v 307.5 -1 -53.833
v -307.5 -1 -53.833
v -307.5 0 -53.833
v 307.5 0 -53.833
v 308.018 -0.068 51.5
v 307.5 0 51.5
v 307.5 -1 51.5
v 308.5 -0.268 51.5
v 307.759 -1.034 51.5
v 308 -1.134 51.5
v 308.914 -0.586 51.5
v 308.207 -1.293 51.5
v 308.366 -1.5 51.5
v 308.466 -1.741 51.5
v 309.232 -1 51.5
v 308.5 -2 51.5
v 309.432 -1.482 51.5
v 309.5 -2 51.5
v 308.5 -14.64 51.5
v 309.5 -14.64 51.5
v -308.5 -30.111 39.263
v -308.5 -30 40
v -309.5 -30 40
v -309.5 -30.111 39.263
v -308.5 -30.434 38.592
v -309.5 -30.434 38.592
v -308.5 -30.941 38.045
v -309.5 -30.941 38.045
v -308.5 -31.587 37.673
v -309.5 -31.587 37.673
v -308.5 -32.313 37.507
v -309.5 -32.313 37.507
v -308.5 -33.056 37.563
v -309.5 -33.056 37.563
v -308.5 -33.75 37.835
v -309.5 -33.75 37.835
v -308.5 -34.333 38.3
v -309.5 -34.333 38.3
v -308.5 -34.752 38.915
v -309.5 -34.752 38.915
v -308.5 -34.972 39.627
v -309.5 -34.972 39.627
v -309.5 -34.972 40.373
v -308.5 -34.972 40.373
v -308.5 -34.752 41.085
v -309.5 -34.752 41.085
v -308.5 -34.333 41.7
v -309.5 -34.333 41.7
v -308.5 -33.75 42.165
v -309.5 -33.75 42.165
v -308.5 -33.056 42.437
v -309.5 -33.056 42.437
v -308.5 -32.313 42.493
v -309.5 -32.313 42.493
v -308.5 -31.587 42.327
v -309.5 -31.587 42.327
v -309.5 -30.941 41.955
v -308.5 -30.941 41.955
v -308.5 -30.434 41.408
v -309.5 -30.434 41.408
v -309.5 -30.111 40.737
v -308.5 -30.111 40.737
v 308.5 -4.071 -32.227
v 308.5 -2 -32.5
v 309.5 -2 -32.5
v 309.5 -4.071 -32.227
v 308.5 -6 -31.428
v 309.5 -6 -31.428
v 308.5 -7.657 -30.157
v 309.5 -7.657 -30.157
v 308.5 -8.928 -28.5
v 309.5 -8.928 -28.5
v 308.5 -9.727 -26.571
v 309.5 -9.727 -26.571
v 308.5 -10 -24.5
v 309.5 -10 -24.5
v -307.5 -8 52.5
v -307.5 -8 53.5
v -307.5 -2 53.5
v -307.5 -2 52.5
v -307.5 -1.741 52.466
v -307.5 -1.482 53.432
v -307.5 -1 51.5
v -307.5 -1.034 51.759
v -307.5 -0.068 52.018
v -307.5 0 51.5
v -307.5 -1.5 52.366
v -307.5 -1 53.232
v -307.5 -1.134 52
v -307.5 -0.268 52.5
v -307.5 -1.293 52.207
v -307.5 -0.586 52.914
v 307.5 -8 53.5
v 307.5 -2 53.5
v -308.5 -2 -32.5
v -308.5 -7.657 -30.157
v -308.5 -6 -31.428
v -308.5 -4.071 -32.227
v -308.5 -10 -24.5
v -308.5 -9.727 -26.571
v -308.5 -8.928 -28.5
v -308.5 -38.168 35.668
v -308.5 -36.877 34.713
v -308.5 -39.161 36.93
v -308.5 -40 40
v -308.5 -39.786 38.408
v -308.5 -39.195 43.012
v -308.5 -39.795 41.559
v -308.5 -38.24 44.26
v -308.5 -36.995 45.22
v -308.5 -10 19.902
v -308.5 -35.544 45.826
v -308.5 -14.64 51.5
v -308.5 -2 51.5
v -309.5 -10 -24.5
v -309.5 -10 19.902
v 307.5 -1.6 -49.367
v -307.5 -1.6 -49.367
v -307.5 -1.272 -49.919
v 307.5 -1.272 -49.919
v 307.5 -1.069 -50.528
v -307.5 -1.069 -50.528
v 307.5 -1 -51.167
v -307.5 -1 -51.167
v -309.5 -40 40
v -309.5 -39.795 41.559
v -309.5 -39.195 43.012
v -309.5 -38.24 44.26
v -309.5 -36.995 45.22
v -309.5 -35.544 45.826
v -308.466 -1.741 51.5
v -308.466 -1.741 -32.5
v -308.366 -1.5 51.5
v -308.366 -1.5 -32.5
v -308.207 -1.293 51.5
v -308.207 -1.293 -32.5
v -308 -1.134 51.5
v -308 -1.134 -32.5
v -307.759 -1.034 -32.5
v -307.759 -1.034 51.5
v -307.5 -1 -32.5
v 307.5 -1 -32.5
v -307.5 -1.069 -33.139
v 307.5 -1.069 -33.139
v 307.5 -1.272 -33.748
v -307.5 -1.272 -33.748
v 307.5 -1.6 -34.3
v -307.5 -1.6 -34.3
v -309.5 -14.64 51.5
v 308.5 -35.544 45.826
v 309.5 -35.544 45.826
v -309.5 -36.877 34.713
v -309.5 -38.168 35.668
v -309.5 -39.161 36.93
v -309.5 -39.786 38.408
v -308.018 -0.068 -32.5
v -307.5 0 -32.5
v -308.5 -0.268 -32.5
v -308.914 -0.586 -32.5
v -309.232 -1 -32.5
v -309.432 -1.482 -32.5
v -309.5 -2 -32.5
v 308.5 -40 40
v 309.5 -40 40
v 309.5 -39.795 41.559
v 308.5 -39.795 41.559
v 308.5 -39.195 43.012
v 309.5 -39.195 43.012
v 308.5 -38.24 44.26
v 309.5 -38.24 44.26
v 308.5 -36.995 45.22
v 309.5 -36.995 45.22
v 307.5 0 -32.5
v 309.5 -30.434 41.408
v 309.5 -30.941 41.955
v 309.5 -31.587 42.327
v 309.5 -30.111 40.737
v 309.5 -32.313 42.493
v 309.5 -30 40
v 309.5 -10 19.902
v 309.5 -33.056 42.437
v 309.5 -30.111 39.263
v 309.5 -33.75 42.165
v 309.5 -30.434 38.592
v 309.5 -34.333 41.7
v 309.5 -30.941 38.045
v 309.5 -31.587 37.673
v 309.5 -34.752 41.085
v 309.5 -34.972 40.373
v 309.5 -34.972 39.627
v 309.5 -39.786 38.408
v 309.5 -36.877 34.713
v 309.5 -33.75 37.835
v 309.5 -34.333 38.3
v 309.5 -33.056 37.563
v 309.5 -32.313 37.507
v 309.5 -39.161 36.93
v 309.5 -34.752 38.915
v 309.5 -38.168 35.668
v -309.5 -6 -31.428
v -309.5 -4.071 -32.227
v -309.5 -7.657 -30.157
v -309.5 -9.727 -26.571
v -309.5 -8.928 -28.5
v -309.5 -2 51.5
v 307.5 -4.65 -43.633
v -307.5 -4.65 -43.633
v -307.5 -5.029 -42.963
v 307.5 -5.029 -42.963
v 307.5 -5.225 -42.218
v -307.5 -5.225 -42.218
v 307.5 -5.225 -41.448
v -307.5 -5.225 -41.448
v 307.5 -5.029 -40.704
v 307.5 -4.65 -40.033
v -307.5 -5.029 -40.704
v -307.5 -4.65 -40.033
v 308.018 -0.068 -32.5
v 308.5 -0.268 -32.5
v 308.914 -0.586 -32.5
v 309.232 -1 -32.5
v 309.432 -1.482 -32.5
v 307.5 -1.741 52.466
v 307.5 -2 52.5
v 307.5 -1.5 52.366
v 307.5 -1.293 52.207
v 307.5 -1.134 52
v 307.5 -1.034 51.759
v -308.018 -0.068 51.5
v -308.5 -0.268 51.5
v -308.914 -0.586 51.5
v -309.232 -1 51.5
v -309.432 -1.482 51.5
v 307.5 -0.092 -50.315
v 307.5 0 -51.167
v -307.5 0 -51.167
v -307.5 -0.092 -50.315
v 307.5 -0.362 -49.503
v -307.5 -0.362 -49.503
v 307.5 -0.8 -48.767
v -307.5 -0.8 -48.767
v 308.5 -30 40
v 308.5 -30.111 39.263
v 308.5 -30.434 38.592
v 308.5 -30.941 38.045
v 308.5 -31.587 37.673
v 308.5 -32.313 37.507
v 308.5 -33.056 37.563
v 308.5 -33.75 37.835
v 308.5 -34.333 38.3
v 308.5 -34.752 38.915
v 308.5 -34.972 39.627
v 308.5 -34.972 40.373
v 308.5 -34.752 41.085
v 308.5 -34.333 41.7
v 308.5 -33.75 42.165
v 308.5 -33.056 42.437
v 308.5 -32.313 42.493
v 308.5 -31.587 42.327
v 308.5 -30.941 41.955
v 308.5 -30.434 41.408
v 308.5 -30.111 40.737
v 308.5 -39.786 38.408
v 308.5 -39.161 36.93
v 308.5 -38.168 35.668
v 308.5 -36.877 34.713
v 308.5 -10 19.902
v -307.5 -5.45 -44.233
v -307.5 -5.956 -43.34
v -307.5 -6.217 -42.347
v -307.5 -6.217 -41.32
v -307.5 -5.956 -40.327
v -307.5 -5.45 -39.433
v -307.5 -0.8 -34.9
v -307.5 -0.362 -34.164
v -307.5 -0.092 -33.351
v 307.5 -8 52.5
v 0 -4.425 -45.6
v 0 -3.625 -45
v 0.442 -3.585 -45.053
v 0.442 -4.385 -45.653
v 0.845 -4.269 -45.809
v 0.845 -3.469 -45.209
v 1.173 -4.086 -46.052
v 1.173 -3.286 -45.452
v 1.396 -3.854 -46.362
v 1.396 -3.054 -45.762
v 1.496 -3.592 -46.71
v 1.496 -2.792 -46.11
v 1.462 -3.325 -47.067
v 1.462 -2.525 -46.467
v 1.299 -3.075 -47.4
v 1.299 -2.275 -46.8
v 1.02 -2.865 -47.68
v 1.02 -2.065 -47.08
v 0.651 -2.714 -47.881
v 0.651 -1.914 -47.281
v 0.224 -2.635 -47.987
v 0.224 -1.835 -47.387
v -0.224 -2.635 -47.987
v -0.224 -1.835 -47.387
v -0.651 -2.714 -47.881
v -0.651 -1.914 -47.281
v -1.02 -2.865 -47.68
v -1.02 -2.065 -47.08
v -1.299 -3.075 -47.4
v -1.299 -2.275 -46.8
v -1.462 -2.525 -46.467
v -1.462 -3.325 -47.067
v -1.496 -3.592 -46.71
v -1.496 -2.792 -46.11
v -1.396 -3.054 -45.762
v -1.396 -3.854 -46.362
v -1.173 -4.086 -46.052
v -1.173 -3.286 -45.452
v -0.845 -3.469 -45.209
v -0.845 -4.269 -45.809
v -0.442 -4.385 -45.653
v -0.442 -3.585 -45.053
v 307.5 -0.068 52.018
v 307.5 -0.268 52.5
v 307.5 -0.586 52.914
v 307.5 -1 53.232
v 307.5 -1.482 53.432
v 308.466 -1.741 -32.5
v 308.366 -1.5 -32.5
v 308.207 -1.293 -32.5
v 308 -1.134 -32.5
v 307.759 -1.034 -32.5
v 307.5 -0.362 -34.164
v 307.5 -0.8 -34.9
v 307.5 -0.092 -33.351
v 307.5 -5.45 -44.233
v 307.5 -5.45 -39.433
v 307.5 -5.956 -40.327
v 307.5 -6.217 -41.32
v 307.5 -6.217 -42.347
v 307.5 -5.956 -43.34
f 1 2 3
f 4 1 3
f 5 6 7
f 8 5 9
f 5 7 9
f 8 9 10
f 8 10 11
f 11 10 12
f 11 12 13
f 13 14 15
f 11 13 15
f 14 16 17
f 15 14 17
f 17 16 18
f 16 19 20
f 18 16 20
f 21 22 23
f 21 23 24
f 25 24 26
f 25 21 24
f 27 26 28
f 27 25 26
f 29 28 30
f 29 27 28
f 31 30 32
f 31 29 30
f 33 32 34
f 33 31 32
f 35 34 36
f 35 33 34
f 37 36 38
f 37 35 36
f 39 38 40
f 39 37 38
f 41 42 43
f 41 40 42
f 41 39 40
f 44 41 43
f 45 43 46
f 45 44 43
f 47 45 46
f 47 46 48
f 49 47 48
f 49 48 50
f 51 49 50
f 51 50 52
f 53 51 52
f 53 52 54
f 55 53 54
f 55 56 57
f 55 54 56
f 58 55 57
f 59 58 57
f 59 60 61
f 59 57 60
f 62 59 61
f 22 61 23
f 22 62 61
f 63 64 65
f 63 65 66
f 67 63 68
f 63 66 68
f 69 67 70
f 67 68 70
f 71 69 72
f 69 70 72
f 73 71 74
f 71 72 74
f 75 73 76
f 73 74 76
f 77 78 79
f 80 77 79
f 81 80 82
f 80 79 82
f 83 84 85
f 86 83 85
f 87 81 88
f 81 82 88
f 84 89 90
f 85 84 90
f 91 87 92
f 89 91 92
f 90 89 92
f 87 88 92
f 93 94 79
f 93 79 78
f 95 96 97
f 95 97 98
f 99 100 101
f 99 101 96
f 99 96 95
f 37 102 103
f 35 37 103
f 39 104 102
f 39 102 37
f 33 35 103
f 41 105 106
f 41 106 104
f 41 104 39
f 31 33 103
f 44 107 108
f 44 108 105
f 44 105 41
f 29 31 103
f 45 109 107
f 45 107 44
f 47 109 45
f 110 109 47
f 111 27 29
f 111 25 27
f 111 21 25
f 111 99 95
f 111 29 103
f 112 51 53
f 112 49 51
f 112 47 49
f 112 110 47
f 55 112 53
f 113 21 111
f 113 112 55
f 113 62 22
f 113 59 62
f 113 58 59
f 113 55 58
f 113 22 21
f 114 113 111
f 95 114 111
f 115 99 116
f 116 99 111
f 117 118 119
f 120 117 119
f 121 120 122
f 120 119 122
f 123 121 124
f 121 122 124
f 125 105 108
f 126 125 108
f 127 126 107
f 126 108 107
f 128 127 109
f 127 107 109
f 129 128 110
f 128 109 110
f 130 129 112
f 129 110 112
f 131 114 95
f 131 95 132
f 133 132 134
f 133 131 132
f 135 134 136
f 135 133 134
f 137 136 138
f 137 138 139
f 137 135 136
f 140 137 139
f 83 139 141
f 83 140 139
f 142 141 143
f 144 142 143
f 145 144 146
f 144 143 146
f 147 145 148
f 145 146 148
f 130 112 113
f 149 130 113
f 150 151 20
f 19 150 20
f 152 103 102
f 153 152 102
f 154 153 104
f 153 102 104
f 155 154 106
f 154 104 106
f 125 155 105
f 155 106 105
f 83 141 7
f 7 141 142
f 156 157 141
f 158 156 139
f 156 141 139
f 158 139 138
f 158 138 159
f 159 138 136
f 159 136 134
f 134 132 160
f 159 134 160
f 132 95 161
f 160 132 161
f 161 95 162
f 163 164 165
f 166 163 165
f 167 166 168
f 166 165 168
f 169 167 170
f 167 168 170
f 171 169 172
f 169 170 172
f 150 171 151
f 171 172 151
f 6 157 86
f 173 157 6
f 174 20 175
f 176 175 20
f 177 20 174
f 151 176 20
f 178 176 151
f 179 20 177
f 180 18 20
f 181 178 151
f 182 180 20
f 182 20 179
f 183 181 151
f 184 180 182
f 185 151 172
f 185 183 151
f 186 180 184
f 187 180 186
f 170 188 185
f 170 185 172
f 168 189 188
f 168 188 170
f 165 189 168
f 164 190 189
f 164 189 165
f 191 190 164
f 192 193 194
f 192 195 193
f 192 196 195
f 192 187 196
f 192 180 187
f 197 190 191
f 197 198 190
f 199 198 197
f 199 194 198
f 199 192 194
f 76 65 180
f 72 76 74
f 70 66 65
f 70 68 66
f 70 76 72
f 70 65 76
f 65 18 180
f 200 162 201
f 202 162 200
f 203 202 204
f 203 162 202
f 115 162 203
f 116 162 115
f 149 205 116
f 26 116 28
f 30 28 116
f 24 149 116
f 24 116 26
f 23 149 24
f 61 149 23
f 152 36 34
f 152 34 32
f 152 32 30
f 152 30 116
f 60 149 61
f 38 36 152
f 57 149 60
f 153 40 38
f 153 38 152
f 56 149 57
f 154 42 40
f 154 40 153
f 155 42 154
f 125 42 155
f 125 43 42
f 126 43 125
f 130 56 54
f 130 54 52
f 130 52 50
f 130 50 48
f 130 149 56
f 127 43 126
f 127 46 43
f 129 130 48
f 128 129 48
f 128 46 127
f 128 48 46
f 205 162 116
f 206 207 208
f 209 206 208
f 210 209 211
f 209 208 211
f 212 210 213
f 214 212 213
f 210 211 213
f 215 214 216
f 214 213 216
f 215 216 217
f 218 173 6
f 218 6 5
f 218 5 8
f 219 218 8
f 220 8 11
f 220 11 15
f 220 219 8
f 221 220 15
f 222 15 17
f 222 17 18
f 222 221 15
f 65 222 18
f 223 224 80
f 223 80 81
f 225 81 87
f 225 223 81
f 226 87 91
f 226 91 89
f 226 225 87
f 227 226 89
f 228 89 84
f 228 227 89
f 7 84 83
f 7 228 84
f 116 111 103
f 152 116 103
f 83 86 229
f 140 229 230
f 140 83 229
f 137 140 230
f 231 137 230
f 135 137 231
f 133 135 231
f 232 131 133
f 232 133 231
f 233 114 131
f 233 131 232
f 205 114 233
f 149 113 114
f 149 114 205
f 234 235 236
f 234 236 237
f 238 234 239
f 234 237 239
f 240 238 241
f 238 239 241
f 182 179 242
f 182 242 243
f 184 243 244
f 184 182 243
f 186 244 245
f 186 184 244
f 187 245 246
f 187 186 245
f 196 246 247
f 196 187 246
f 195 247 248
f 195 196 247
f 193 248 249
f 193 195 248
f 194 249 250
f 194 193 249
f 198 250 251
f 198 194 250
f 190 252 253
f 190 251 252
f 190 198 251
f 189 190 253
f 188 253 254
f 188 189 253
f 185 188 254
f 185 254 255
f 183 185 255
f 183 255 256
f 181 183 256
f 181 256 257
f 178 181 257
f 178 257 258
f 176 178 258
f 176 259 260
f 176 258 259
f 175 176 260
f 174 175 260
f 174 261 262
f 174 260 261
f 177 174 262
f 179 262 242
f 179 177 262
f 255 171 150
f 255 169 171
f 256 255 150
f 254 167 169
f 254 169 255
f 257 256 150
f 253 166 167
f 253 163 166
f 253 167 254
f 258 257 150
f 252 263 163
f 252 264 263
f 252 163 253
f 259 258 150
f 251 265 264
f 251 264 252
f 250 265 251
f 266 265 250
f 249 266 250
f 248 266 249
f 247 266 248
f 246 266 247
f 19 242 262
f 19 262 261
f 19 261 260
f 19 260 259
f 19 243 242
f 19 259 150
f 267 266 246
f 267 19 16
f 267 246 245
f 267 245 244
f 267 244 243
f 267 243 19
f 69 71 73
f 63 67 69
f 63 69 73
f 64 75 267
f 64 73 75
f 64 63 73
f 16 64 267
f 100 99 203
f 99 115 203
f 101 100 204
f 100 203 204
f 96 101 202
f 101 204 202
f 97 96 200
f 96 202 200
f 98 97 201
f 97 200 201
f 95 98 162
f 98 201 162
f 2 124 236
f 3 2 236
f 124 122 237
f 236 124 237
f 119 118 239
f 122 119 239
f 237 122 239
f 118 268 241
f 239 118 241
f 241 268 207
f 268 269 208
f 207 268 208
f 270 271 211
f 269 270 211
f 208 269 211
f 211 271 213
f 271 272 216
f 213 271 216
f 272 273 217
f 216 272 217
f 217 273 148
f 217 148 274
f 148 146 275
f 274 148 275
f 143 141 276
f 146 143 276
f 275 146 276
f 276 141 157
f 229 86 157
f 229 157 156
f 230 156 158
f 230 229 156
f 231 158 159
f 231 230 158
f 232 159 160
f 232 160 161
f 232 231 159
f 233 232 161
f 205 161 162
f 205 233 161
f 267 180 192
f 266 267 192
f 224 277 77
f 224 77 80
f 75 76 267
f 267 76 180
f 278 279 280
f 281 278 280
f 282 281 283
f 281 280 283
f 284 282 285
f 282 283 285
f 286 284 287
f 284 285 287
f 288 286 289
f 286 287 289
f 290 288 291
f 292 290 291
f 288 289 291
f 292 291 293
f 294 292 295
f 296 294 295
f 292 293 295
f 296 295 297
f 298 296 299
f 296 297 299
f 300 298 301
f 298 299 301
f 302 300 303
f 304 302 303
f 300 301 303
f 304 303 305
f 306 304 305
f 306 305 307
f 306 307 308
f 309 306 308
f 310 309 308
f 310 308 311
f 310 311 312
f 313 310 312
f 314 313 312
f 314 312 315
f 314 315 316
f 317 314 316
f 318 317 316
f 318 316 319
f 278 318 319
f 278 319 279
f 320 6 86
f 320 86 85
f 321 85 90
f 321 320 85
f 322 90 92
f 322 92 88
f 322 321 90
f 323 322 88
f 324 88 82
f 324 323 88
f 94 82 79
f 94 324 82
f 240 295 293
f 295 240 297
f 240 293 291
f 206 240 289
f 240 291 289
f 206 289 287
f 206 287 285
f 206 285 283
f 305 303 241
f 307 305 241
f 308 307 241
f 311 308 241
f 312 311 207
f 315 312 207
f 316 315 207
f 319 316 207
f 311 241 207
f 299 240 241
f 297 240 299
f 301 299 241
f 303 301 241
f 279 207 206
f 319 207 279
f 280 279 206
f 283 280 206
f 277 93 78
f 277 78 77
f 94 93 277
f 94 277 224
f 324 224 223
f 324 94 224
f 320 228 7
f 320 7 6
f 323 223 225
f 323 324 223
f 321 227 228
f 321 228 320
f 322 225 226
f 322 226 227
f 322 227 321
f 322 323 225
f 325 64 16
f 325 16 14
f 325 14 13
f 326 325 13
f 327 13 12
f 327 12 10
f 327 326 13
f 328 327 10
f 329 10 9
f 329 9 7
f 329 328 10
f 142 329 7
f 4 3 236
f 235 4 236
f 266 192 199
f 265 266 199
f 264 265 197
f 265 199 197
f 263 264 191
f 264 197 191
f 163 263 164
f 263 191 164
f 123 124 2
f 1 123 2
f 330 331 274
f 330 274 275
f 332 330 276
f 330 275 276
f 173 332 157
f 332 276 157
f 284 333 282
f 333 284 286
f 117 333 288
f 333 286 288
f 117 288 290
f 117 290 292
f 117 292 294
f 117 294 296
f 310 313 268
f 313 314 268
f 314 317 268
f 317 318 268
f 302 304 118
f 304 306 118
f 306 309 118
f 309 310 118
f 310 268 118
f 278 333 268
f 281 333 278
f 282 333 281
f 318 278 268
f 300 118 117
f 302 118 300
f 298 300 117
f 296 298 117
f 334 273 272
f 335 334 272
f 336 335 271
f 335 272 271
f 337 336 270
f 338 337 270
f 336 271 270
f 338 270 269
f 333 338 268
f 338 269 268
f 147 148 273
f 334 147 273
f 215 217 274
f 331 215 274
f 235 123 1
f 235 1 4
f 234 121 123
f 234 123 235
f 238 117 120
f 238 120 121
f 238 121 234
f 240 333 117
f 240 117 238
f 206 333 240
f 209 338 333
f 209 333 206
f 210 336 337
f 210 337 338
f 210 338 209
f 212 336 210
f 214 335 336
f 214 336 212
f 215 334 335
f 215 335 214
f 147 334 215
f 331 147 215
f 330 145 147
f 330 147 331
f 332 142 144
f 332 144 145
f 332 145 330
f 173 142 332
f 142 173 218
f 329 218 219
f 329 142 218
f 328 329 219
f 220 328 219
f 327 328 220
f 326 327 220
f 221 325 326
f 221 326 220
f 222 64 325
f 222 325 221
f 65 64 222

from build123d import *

# Parameters (mm, degrees)
SKETCH1_W                    = 615
SKETCH1_H                    = 105
BASE_FLANGE1_DEPTH           = 1
EDGE_FLANGE1_STRIP_W         = 6
EDGE_FLANGE1_STRIP_H         = 1
EDGE_FLANGE1_STRIP_CUT_DEPTH = 615
EDGE_FLANGE1_DEPTH           = 615
SKETCH16_W                   = 615
SKETCH16_H                   = 196.52545168
CUT_EXTRUDE1_DEPTH           = 10
SWEPT_START                  = -307.5
SWEPT_FLANGE1_DEPTH          = 615
EDGE_FLANGE2_DEPTH           = 84
EDGE_FLANGE2_BEND_DEPTH      = 84
CUT_EXTRUDE2_DEPTH           = 623.622700982
CUT_EXTRUDE2_DEPTH_BACK      = 623.622700982
SKETCH39_R                   = 2.5
FILLET1_R                    = 8
SKETCH45_R                   = 1.5
CUT_EXTRUDE3_DEPTH           = 10


# Read off the part's stored shape, not the designer's step: Swept Flange1
# Sheet-metal steps are written as plain solids
with BuildPart() as part:
    # Sketch1 → Base-Flange1 (new body)
    with BuildSketch(Plane(origin=(0, 0, 0), x_dir=(1, 0, 0), z_dir=(0, 1, 0))):
        Rectangle(SKETCH1_W, SKETCH1_H)
    extrude(amount=-BASE_FLANGE1_DEPTH)

    # Edge-Flange1 strip (across the edge) → Edge-Flange1 strip cut (cut)
    with BuildSketch(Plane(origin=(307.5, -1, 52.5), x_dir=(0, 0, -1), z_dir=(-1, 0, 0))):
        with Locations((-2, -0.5)):
            Rectangle(EDGE_FLANGE1_STRIP_W, EDGE_FLANGE1_STRIP_H)
    extrude(amount=EDGE_FLANGE1_STRIP_CUT_DEPTH, mode=Mode.SUBTRACT)

    # Edge-Flange1 section (across the edge) → Edge-Flange1 (add)
    with BuildSketch(Plane(origin=(307.5, -1, 52.5), x_dir=(0, 0, -1), z_dir=(-1, 0, 0))):
        with BuildLine():
            Line((-1, 1), (-1, 7))
            Line((-1, 7), (0, 7))
            Line((0, 7), (0, 1))
            ThreePointArc((0, 1), (0.292893219, 0.292893219), (1, 0))
            Line((1, 0), (1, -1))
            ThreePointArc((1, -1), (-0.414213562, -0.414213562), (-1, 1))
        make_face()
    extrude(amount=EDGE_FLANGE1_DEPTH)

    # Sketch16 → Cut-Extrude1 (cut)
    with BuildSketch(Plane(origin=(0, 0, 0), x_dir=(1, 0, 0), z_dir=(0, 1, 0))):
        with Locations((0, 130.76272584)):
            Rectangle(SKETCH16_W, SKETCH16_H)
    extrude(amount=-CUT_EXTRUDE1_DEPTH, mode=Mode.SUBTRACT)

    # Swept Flange1 outline → Swept Flange1 (add)
    with BuildSketch(Plane.YZ.offset(SWEPT_START)):
        with BuildLine():
            Line((-1, -51.166666667), (-1, -53.833333333))
            Line((-1, -53.833333333), (0, -53.833333333))
            Line((0, -53.833333333), (0, -51.166666667))
            ThreePointArc((0, -51.166666667), (-0.205266808, -49.901755603), (-0.8, -48.766666667))
            Line((-0.8, -48.766666667), (-4.65, -43.633333333))
            ThreePointArc((-4.65, -43.633333333), (-5.25, -41.833333333), (-4.65, -40.033333333))
            Line((-4.65, -40.033333333), (-0.8, -34.9))
            ThreePointArc((-0.8, -34.9), (-0.205266808, -33.764911064), (0, -32.5))
            Line((0, -32.5), (-1, -32.5))
            ThreePointArc((-1, -32.5), (-1.153950106, -33.448683298), (-1.6, -34.3))
            Line((-1.6, -34.3), (-5.45, -39.433333333))
            ThreePointArc((-5.45, -39.433333333), (-6.25, -41.833333333), (-5.45, -44.233333333))
            Line((-5.45, -44.233333333), (-1.6, -49.366666667))
            ThreePointArc((-1.6, -49.366666667), (-1.153950106, -50.217983369), (-1, -51.166666667))
        make_face()
    extrude(amount=SWEPT_FLANGE1_DEPTH)

    # Edge-Flange2 section (across the edge) → Edge-Flange2 (add)
    with BuildSketch(Plane(origin=(308.5, -1, -32.5), x_dir=(-1, 0, 0), z_dir=(0, 0, 1))):
        with BuildLine():
            Line((-1, 1), (-1, 39))
            Line((-1, 39), (0, 39))
            Line((0, 39), (0, 1))
            ThreePointArc((0, 1), (0.292893219, 0.292893219), (1, 0))
            Line((1, 0), (1, -1))
            ThreePointArc((1, -1), (-0.414213562, -0.414213562), (-1, 1))
        make_face()
    extrude(amount=EDGE_FLANGE2_DEPTH)

    # Edge-Flange2 section 2 (across the edge) → Edge-Flange2 bend (add)
    with BuildSketch(Plane(origin=(-308.5, -1, 51.5), x_dir=(1, 0, 0), z_dir=(0, 0, -1))):
        with BuildLine():
            Line((-1, 1), (-1, 39))
            Line((-1, 39), (0, 39))
            Line((0, 39), (0, 1))
            ThreePointArc((0, 1), (0.292893219, 0.292893219), (1, 0))
            Line((1, 0), (1, -1))
            ThreePointArc((1, -1), (-0.414213562, -0.414213562), (-1, 1))
        make_face()
    extrude(amount=EDGE_FLANGE2_BEND_DEPTH)

    # Sketch39 → Cut-Extrude2 (cut, two sides: drawn at the far end of the back side and taken through both)
    with BuildSketch(Plane.ZY.offset(309.5).offset(-CUT_EXTRUDE2_DEPTH_BACK)):
        with Locations(Location((40, -32.5, 0), (0, 0, 90))):
            Circle(SKETCH39_R)
        with BuildLine():
            Line((-32.5, -10), (19.901558991, -10))
            Line((19.901558991, -10), (34.712752069, -36.876753821))
            ThreePointArc((34.712752069, -36.876753821), (36.929590525, -39.160869046), (40, -40))
            ThreePointArc((40, -40), (43.667304301, -38.758423068), (45.82614719, -35.544386433))
            Line((45.82614719, -35.544386433), (51.5, -14.63988364))
            Line((51.5, -14.63988364), (60.41713226, -14.63988364))
            Line((60.41713226, -14.63988364), (60.41713226, -59.649041705))
            Line((60.41713226, -59.649041705), (-51.871278106, -59.649041705))
            Line((-51.871278106, -59.649041705), (-51.871278106, -10))
            Line((-51.871278106, -10), (-32.5, -10))
        make_face()
    extrude(amount=CUT_EXTRUDE2_DEPTH + CUT_EXTRUDE2_DEPTH_BACK, mode=Mode.SUBTRACT)

    # Fillet1
    fillet1_edges = [part.edges().sort_by_distance(p)[0] for p in [
        (-309, -10, -32.5),
        (309, -10, -32.5),
    ]]
    fillet(fillet1_edges, radius=FILLET1_R)

    # Sketch45 → Cut-Extrude3 (cut)
    with BuildSketch(Plane(origin=(0, -23.92, -17.94), x_dir=(1, 0, 0), z_dir=(0, 0.7999999999999998, 0.6000000000000002))):
        with Locations(Location((0, 35.325, 0), (0, 0, 270))):
            Circle(SKETCH45_R)
    extrude(amount=-CUT_EXTRUDE3_DEPTH, mode=Mode.SUBTRACT)


solid = part.part
